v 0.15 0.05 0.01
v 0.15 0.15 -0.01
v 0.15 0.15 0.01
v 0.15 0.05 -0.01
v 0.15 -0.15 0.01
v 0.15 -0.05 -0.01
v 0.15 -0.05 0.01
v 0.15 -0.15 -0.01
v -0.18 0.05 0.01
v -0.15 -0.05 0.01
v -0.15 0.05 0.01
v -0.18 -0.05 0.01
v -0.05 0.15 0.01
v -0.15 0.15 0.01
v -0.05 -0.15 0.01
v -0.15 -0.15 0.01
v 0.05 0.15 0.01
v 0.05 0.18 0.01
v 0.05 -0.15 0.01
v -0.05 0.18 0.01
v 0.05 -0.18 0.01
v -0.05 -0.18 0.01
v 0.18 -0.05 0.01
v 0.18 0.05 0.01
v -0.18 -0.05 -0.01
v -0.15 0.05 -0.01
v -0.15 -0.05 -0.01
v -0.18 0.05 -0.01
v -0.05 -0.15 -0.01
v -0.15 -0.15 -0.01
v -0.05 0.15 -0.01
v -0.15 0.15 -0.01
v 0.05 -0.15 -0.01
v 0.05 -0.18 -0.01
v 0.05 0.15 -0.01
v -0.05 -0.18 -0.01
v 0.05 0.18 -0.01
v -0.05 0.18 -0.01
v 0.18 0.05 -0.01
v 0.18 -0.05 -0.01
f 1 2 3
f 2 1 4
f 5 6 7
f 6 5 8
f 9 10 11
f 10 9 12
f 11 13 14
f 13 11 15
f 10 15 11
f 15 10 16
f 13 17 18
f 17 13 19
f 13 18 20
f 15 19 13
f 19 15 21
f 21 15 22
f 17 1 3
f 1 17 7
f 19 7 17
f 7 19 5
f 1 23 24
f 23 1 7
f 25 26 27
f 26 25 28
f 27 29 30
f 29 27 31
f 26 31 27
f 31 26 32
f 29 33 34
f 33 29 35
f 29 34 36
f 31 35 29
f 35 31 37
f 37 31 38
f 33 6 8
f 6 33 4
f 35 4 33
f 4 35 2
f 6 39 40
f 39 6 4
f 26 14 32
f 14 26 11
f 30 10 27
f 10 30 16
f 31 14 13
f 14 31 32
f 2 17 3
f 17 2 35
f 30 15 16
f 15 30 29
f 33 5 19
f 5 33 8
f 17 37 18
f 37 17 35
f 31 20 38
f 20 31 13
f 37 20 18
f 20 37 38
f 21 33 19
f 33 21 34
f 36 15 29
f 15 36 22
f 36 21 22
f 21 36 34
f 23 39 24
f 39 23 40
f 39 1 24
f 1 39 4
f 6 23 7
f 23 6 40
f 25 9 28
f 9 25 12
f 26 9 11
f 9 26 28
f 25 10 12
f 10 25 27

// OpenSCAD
$fn=64;

plate_w = 0.3;
plate_h = 0.3;
plate_t = 0.02;

tab_top_w = 0.10;
tab_top_d = 0.03;

tab_bottom_w = 0.10;
tab_bottom_d = 0.03;

tab_side_h = 0.10;
tab_side_d = 0.03;

module base_plate() {
    cube([plate_w, plate_h, plate_t], center=true);
}

module top_tab() {
    translate([0, plate_h/2 + tab_top_d/2, 0])
        cube([tab_top_w, tab_top_d, plate_t], center=true);
}

module bottom_tab() {
    translate([0, -(plate_h/2 + tab_bottom_d/2), 0])
        cube([tab_bottom_w, tab_bottom_d, plate_t], center=true);
}

module right_side_tab() {
    translate([plate_w/2 + tab_side_d/2, 0, 0])
        cube([tab_side_d, tab_side_h, plate_t], center=true);
}

module left_side_tab() {
    translate([-(plate_w/2 + tab_side_d/2), 0, 0])
        cube([tab_side_d, tab_side_h, plate_t], center=true);
}

union() {
    base_plate();
    top_tab();
    bottom_tab();
    right_side_tab();
    left_side_tab();
}
